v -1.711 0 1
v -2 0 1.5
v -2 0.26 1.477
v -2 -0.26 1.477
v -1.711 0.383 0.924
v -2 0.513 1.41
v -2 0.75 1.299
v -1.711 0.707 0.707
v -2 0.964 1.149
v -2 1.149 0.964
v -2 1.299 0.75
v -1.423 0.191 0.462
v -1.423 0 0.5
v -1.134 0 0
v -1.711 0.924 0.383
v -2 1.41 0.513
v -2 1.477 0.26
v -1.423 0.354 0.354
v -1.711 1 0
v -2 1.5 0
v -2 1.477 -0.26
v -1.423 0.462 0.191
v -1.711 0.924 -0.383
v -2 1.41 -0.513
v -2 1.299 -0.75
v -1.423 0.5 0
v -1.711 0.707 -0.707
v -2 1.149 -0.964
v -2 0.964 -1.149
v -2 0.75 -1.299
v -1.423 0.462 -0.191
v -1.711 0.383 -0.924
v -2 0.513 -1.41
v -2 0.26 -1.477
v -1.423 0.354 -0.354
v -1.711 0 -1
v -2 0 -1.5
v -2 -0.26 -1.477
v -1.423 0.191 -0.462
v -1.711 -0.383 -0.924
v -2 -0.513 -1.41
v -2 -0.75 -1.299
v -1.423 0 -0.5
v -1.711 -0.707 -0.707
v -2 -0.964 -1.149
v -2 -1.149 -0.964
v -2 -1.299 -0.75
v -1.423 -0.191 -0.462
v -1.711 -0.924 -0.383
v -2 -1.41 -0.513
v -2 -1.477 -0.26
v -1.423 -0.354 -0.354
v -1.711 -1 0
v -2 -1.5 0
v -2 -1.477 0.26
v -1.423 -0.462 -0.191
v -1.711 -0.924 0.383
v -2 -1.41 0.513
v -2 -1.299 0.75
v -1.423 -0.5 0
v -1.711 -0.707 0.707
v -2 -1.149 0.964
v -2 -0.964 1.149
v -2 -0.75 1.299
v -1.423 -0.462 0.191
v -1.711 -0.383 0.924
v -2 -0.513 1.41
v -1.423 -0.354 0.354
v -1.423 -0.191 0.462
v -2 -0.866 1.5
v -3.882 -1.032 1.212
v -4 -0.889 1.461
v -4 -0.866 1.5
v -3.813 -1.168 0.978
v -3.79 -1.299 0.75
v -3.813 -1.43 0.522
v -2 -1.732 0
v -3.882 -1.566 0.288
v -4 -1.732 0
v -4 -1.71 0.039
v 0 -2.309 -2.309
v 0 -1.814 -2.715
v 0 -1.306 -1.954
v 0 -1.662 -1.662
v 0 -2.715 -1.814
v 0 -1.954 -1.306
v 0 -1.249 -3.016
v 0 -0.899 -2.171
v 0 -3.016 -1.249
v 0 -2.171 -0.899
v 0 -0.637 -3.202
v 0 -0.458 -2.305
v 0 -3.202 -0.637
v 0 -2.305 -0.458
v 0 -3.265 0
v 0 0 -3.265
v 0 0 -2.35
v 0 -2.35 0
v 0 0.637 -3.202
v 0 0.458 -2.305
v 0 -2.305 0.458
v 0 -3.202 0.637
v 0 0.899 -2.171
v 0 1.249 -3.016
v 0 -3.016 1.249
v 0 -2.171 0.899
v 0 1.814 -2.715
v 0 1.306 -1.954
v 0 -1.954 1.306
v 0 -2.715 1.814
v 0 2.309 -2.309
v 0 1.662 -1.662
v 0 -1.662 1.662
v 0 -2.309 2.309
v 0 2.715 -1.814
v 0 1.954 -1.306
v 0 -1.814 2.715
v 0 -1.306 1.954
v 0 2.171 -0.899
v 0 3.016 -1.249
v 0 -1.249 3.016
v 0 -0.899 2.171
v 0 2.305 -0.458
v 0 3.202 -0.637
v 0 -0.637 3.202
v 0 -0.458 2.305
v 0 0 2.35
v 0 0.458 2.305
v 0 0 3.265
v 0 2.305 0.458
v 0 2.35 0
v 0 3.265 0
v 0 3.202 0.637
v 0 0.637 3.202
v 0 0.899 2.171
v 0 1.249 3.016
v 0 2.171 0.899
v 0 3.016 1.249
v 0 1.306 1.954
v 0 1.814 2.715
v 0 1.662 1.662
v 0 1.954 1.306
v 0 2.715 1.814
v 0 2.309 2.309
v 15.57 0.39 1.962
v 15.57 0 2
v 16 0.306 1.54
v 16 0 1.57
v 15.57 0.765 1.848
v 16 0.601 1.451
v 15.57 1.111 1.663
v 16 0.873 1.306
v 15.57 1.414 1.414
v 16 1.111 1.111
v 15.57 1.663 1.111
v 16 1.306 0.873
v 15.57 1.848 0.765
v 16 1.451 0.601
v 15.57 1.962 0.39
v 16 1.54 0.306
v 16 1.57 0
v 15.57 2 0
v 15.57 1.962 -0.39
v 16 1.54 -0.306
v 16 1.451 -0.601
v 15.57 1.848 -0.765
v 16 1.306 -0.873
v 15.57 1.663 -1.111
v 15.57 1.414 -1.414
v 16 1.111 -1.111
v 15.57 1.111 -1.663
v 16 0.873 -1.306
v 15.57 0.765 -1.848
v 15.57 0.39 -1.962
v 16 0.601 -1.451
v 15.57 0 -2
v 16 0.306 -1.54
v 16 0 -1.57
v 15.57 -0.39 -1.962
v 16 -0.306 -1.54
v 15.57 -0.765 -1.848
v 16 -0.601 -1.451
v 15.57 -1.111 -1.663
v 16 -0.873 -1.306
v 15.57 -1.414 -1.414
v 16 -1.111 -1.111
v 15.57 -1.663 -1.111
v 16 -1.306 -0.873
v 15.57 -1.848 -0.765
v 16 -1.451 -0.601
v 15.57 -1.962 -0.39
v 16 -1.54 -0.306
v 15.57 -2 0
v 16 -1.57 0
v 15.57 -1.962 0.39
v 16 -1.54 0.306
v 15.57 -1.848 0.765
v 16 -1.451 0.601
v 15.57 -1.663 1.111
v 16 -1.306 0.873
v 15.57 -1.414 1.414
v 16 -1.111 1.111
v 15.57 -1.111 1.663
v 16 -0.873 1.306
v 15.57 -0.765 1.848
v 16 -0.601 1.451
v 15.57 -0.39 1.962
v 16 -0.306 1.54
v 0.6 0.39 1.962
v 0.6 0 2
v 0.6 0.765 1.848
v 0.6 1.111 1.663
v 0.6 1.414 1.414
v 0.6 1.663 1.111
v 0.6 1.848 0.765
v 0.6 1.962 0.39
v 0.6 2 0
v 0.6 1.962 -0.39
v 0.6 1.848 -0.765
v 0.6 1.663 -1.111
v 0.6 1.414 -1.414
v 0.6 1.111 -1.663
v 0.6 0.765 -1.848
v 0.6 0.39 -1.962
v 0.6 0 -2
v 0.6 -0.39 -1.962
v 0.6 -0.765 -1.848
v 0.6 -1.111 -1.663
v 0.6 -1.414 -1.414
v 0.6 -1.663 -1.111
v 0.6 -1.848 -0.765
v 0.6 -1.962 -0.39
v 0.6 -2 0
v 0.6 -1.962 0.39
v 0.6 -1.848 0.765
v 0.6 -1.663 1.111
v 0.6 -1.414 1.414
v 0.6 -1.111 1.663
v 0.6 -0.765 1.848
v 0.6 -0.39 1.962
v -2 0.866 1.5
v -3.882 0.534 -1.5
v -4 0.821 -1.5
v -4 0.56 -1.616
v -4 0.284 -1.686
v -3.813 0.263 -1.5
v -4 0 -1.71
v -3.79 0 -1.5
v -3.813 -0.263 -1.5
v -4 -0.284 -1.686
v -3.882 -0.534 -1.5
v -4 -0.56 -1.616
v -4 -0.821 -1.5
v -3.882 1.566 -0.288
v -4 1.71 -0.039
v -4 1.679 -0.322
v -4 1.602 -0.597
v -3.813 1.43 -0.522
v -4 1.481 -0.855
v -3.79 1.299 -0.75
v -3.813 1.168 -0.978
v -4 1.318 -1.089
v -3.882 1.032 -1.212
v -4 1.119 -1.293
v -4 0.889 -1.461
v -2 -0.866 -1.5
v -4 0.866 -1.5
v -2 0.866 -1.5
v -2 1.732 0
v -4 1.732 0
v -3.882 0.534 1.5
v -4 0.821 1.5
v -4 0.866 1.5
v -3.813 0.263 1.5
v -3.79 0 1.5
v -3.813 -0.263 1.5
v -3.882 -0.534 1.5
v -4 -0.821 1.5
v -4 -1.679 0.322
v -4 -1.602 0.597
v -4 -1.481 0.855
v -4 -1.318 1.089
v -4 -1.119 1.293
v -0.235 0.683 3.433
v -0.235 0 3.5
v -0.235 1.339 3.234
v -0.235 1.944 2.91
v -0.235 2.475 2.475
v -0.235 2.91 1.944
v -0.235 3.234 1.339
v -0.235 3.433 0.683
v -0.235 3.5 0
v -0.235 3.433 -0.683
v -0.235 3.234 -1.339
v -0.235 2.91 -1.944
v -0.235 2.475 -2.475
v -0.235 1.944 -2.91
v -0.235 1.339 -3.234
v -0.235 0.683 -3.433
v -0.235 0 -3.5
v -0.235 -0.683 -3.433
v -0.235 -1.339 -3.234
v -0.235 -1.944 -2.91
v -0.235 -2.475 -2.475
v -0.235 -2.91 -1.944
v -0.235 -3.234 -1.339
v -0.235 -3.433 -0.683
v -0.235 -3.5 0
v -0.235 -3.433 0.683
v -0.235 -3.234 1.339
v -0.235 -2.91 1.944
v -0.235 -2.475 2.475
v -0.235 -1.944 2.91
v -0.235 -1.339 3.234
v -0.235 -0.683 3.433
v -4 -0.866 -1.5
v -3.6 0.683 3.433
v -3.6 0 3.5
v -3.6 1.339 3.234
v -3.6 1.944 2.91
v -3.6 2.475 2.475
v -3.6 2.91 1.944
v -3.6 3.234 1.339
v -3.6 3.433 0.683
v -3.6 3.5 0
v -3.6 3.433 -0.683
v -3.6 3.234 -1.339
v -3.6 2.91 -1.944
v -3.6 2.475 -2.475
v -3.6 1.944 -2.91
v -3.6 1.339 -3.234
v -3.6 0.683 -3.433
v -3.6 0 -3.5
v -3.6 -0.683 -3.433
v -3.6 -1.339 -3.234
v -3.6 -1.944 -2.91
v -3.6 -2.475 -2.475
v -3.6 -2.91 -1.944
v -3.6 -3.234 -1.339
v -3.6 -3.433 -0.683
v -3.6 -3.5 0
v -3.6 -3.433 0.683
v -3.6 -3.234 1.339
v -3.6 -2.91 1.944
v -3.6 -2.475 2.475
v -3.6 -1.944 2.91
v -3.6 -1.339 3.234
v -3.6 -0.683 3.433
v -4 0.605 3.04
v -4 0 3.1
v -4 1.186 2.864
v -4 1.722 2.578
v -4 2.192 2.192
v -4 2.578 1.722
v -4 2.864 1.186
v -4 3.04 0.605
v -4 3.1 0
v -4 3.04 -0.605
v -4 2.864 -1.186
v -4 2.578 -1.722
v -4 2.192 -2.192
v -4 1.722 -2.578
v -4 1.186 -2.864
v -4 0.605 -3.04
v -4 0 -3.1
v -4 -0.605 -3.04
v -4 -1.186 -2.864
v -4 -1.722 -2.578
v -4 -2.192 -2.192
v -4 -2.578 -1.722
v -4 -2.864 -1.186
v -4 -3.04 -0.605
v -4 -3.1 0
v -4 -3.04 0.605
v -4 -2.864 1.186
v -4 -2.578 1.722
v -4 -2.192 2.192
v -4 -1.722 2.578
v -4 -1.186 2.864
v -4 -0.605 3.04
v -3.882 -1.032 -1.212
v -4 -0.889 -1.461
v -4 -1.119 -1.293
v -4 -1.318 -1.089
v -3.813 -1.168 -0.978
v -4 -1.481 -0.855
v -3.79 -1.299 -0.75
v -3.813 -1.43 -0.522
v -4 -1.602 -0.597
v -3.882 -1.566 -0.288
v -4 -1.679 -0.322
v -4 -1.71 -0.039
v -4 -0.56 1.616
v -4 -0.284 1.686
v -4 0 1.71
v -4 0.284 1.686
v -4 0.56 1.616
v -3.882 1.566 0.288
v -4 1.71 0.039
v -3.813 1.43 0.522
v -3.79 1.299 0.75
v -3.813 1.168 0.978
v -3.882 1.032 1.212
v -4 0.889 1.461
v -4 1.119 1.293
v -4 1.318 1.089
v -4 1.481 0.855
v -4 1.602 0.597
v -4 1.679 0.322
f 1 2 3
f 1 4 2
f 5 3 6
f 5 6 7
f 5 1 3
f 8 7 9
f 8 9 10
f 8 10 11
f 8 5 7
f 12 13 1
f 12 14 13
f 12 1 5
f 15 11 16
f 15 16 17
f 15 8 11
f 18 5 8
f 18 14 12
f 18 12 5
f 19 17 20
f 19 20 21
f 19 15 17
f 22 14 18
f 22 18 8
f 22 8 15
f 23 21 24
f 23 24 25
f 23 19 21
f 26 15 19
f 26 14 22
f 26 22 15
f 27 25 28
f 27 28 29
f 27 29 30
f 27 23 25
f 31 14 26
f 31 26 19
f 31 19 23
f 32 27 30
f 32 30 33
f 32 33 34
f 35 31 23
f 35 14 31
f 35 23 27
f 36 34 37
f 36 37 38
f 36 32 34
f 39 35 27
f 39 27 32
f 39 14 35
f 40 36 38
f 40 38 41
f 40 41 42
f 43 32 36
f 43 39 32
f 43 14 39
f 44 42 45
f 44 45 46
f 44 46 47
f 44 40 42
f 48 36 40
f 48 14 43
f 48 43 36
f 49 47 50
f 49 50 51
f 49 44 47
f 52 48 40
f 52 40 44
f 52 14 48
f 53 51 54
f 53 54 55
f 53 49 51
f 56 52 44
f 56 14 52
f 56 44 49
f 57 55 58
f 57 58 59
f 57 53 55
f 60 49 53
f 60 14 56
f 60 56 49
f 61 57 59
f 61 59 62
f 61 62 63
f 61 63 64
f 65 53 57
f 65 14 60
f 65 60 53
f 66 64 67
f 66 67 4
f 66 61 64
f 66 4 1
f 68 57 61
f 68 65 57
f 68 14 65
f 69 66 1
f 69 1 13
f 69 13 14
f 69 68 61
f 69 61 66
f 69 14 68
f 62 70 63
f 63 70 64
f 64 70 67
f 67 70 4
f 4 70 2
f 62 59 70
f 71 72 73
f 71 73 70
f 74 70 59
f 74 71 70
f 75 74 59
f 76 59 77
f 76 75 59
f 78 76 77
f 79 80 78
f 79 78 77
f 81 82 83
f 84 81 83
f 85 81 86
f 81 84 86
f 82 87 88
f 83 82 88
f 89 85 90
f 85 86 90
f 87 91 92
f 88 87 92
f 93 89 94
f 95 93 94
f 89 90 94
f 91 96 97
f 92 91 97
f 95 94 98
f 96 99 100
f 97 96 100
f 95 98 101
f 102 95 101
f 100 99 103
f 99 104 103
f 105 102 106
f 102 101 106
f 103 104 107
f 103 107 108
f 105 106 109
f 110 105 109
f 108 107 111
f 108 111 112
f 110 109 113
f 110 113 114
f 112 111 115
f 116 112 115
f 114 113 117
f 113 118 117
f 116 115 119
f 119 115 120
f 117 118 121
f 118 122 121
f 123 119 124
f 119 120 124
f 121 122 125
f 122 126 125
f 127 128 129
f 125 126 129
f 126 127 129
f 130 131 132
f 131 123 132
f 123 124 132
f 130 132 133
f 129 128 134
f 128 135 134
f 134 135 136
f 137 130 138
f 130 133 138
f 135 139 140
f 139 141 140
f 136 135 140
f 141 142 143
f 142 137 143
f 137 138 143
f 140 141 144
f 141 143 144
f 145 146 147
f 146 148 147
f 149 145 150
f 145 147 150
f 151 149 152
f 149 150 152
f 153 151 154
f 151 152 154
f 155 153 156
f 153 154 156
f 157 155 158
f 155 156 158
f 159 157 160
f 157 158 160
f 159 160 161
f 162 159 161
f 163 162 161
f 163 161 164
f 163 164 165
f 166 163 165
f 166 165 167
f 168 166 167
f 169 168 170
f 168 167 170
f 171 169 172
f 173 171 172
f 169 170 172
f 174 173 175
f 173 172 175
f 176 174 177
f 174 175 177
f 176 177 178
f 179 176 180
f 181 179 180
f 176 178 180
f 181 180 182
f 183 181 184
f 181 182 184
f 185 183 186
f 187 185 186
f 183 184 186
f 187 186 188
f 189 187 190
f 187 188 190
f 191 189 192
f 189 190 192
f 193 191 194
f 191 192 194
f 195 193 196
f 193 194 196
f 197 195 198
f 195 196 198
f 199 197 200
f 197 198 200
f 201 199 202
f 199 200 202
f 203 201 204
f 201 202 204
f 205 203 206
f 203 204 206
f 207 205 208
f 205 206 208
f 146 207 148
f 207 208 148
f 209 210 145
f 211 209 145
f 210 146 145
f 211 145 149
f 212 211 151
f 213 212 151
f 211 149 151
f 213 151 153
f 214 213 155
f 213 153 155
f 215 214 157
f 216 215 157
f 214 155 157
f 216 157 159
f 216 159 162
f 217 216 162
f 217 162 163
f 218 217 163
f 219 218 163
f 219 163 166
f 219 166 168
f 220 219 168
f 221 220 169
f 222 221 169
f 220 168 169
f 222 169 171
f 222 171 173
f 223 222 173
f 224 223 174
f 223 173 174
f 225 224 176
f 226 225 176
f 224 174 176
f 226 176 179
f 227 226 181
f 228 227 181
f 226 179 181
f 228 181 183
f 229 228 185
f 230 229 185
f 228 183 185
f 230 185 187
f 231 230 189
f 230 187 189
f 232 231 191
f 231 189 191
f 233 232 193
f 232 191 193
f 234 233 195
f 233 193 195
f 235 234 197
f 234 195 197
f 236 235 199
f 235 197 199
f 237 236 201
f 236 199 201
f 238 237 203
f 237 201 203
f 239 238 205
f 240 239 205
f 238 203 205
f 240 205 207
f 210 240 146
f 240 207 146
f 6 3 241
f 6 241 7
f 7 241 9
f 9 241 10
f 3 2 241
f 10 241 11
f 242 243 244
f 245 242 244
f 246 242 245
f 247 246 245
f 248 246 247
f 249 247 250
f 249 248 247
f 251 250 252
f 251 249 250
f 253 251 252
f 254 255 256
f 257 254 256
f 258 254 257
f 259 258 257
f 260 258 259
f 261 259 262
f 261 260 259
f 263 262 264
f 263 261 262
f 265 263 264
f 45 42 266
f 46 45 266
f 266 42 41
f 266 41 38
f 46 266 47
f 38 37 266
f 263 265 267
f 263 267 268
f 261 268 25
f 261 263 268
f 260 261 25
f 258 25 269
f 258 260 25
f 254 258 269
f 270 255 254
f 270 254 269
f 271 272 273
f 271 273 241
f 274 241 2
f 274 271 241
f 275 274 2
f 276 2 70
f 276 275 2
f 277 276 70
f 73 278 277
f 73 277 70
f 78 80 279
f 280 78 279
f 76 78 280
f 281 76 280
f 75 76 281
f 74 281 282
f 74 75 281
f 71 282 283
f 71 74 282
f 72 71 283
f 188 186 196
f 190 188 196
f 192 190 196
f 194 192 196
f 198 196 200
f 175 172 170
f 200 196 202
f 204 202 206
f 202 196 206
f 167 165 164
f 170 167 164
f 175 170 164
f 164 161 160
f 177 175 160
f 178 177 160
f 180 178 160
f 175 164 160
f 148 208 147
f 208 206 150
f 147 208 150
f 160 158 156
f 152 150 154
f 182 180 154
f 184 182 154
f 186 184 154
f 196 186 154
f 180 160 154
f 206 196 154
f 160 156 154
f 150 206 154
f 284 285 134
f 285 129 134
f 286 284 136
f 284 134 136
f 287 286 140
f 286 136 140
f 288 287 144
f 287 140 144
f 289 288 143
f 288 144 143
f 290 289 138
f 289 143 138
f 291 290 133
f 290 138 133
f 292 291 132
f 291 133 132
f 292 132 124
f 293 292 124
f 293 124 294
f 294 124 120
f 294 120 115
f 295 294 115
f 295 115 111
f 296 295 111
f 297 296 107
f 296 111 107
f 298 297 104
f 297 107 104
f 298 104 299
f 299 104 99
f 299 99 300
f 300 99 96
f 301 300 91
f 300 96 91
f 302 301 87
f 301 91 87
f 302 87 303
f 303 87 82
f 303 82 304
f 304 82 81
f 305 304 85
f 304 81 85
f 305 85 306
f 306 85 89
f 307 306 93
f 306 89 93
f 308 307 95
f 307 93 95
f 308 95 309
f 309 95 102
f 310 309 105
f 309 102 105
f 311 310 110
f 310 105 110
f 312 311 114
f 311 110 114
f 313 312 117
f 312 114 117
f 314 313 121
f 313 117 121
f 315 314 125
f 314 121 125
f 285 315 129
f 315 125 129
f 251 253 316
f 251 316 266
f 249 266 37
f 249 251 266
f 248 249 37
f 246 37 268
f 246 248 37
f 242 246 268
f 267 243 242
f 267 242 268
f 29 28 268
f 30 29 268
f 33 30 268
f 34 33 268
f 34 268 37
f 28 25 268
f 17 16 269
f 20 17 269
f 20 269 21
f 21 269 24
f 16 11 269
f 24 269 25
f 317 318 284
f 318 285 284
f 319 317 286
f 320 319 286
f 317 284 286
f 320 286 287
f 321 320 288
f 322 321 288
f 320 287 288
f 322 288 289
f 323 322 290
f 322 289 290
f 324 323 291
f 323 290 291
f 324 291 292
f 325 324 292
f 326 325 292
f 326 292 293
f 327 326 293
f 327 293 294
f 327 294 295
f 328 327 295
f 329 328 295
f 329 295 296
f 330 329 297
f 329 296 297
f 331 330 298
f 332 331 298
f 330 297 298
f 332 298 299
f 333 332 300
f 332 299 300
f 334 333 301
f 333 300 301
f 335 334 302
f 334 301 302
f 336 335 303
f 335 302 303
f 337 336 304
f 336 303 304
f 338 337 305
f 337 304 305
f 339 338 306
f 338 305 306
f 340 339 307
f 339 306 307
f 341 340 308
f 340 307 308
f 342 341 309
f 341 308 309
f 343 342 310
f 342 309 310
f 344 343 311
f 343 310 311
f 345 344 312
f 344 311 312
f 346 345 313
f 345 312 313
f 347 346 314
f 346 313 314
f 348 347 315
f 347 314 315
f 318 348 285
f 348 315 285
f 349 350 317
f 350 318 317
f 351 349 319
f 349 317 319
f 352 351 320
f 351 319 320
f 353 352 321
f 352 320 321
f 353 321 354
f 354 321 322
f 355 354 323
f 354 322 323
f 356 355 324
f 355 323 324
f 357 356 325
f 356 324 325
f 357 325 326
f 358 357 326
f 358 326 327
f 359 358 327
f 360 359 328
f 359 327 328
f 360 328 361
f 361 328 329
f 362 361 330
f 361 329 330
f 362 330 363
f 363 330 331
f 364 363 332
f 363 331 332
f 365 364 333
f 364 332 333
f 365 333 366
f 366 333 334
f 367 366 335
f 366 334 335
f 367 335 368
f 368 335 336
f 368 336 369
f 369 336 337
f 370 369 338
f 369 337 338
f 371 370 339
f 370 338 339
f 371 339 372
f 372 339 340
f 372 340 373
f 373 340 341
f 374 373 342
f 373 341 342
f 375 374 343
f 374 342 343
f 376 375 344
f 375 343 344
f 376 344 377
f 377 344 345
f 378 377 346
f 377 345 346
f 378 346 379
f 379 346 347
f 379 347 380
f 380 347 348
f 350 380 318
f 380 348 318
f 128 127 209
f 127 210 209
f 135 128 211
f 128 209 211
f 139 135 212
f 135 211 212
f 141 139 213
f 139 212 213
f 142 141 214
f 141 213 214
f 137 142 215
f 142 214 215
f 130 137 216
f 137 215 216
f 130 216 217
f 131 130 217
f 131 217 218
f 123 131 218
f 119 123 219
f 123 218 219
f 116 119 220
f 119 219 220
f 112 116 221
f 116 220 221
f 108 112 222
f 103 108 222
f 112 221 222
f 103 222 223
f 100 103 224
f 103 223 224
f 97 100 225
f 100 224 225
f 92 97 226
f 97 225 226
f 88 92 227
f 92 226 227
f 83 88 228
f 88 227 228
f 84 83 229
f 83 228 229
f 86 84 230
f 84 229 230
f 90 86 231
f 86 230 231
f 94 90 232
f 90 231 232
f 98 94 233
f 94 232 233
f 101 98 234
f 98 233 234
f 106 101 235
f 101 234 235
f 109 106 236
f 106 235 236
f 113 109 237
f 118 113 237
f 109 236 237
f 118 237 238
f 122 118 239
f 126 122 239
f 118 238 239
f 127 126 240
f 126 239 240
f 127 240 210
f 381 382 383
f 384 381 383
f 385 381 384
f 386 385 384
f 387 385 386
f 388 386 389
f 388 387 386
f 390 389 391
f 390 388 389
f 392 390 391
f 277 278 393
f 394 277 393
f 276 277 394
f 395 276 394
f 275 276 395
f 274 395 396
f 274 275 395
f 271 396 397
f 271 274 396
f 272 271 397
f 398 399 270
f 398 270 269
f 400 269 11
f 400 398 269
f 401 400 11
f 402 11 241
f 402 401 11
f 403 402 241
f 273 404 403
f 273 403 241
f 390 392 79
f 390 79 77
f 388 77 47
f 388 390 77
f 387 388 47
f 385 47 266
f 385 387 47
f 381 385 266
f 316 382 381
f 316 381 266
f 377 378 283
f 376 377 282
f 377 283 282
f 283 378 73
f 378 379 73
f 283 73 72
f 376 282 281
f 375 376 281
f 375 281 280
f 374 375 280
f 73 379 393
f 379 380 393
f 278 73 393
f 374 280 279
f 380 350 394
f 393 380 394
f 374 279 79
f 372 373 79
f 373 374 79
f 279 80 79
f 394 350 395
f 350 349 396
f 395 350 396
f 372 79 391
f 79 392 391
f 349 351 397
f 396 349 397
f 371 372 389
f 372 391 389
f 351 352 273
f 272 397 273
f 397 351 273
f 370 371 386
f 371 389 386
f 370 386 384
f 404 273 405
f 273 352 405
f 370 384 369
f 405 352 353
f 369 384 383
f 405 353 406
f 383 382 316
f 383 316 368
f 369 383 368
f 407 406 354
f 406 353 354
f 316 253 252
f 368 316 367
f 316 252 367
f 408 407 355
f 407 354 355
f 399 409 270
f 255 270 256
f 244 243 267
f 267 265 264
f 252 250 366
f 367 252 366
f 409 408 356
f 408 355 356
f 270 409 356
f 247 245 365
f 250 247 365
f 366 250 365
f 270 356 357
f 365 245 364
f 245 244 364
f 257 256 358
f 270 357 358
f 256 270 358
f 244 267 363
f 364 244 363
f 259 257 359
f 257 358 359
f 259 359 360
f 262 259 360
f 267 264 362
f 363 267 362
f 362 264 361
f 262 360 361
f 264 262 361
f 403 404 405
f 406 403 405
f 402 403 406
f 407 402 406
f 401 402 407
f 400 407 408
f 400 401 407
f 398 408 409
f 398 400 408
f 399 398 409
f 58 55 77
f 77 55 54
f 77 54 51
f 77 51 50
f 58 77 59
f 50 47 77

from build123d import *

# Parameters (mm, degrees)
CUT_EXTRUDE1_DEPTH      = 2
CUT_EXTRUDE1_DEPTH_BACK = 2


with BuildPart() as part:
    # Sketch1 → Revolve1 (revolve)
    with BuildSketch(Plane.XY):
        Polygon((-4, 0), (-4, 3.5), (0, 3.5), (0, 2.35), (0.6, 2), (15.5705, 2), (16, 1.5705), (16, 0), align=None)
    revolve(axis=Axis((16, 0, 0), (-1, 0, 0)))

    # Sketch2 → Cut-Revolve1 (revolve, cut)
    with BuildSketch(Plane.XY):
        Polygon((-4, 3.1), (-3.6, 3.5), (-0.235, 3.5), (0, 3.265), (0, 4.2), (-4, 4.2), align=None)
    revolve(axis=Axis((0, 0, 0), (-1, 0, 0)), mode=Mode.SUBTRACT)

    # Sketch3 → Cut-Revolve2 (revolve, cut)
    with BuildSketch(Plane.XY):
        Polygon((-4, 0), (-4, 1.71), (-3.79, 1.5), (-2, 1.5), (-1.133974596, 0), align=None)
    revolve(axis=Axis((-1.133974596, 0, 0), (-1, 0, 0)), mode=Mode.SUBTRACT)

    # Sketch4 → Cut-Extrude1 (cut, two sides: drawn at the far end of the back side and taken through both)
    with BuildSketch(Plane(origin=(-4, 0, 0), x_dir=(0, 0, -1), z_dir=(1, 0, 0)).offset(-CUT_EXTRUDE1_DEPTH_BACK)):
        Polygon((-1.5, -0.866025404), (0, -1.732050808), (1.5, -0.866025404), (1.5, 0.866025404), (0, 1.732050808), (-1.5, 0.866025404), align=None)
    extrude(amount=CUT_EXTRUDE1_DEPTH + CUT_EXTRUDE1_DEPTH_BACK, mode=Mode.SUBTRACT)


solid = part.part
